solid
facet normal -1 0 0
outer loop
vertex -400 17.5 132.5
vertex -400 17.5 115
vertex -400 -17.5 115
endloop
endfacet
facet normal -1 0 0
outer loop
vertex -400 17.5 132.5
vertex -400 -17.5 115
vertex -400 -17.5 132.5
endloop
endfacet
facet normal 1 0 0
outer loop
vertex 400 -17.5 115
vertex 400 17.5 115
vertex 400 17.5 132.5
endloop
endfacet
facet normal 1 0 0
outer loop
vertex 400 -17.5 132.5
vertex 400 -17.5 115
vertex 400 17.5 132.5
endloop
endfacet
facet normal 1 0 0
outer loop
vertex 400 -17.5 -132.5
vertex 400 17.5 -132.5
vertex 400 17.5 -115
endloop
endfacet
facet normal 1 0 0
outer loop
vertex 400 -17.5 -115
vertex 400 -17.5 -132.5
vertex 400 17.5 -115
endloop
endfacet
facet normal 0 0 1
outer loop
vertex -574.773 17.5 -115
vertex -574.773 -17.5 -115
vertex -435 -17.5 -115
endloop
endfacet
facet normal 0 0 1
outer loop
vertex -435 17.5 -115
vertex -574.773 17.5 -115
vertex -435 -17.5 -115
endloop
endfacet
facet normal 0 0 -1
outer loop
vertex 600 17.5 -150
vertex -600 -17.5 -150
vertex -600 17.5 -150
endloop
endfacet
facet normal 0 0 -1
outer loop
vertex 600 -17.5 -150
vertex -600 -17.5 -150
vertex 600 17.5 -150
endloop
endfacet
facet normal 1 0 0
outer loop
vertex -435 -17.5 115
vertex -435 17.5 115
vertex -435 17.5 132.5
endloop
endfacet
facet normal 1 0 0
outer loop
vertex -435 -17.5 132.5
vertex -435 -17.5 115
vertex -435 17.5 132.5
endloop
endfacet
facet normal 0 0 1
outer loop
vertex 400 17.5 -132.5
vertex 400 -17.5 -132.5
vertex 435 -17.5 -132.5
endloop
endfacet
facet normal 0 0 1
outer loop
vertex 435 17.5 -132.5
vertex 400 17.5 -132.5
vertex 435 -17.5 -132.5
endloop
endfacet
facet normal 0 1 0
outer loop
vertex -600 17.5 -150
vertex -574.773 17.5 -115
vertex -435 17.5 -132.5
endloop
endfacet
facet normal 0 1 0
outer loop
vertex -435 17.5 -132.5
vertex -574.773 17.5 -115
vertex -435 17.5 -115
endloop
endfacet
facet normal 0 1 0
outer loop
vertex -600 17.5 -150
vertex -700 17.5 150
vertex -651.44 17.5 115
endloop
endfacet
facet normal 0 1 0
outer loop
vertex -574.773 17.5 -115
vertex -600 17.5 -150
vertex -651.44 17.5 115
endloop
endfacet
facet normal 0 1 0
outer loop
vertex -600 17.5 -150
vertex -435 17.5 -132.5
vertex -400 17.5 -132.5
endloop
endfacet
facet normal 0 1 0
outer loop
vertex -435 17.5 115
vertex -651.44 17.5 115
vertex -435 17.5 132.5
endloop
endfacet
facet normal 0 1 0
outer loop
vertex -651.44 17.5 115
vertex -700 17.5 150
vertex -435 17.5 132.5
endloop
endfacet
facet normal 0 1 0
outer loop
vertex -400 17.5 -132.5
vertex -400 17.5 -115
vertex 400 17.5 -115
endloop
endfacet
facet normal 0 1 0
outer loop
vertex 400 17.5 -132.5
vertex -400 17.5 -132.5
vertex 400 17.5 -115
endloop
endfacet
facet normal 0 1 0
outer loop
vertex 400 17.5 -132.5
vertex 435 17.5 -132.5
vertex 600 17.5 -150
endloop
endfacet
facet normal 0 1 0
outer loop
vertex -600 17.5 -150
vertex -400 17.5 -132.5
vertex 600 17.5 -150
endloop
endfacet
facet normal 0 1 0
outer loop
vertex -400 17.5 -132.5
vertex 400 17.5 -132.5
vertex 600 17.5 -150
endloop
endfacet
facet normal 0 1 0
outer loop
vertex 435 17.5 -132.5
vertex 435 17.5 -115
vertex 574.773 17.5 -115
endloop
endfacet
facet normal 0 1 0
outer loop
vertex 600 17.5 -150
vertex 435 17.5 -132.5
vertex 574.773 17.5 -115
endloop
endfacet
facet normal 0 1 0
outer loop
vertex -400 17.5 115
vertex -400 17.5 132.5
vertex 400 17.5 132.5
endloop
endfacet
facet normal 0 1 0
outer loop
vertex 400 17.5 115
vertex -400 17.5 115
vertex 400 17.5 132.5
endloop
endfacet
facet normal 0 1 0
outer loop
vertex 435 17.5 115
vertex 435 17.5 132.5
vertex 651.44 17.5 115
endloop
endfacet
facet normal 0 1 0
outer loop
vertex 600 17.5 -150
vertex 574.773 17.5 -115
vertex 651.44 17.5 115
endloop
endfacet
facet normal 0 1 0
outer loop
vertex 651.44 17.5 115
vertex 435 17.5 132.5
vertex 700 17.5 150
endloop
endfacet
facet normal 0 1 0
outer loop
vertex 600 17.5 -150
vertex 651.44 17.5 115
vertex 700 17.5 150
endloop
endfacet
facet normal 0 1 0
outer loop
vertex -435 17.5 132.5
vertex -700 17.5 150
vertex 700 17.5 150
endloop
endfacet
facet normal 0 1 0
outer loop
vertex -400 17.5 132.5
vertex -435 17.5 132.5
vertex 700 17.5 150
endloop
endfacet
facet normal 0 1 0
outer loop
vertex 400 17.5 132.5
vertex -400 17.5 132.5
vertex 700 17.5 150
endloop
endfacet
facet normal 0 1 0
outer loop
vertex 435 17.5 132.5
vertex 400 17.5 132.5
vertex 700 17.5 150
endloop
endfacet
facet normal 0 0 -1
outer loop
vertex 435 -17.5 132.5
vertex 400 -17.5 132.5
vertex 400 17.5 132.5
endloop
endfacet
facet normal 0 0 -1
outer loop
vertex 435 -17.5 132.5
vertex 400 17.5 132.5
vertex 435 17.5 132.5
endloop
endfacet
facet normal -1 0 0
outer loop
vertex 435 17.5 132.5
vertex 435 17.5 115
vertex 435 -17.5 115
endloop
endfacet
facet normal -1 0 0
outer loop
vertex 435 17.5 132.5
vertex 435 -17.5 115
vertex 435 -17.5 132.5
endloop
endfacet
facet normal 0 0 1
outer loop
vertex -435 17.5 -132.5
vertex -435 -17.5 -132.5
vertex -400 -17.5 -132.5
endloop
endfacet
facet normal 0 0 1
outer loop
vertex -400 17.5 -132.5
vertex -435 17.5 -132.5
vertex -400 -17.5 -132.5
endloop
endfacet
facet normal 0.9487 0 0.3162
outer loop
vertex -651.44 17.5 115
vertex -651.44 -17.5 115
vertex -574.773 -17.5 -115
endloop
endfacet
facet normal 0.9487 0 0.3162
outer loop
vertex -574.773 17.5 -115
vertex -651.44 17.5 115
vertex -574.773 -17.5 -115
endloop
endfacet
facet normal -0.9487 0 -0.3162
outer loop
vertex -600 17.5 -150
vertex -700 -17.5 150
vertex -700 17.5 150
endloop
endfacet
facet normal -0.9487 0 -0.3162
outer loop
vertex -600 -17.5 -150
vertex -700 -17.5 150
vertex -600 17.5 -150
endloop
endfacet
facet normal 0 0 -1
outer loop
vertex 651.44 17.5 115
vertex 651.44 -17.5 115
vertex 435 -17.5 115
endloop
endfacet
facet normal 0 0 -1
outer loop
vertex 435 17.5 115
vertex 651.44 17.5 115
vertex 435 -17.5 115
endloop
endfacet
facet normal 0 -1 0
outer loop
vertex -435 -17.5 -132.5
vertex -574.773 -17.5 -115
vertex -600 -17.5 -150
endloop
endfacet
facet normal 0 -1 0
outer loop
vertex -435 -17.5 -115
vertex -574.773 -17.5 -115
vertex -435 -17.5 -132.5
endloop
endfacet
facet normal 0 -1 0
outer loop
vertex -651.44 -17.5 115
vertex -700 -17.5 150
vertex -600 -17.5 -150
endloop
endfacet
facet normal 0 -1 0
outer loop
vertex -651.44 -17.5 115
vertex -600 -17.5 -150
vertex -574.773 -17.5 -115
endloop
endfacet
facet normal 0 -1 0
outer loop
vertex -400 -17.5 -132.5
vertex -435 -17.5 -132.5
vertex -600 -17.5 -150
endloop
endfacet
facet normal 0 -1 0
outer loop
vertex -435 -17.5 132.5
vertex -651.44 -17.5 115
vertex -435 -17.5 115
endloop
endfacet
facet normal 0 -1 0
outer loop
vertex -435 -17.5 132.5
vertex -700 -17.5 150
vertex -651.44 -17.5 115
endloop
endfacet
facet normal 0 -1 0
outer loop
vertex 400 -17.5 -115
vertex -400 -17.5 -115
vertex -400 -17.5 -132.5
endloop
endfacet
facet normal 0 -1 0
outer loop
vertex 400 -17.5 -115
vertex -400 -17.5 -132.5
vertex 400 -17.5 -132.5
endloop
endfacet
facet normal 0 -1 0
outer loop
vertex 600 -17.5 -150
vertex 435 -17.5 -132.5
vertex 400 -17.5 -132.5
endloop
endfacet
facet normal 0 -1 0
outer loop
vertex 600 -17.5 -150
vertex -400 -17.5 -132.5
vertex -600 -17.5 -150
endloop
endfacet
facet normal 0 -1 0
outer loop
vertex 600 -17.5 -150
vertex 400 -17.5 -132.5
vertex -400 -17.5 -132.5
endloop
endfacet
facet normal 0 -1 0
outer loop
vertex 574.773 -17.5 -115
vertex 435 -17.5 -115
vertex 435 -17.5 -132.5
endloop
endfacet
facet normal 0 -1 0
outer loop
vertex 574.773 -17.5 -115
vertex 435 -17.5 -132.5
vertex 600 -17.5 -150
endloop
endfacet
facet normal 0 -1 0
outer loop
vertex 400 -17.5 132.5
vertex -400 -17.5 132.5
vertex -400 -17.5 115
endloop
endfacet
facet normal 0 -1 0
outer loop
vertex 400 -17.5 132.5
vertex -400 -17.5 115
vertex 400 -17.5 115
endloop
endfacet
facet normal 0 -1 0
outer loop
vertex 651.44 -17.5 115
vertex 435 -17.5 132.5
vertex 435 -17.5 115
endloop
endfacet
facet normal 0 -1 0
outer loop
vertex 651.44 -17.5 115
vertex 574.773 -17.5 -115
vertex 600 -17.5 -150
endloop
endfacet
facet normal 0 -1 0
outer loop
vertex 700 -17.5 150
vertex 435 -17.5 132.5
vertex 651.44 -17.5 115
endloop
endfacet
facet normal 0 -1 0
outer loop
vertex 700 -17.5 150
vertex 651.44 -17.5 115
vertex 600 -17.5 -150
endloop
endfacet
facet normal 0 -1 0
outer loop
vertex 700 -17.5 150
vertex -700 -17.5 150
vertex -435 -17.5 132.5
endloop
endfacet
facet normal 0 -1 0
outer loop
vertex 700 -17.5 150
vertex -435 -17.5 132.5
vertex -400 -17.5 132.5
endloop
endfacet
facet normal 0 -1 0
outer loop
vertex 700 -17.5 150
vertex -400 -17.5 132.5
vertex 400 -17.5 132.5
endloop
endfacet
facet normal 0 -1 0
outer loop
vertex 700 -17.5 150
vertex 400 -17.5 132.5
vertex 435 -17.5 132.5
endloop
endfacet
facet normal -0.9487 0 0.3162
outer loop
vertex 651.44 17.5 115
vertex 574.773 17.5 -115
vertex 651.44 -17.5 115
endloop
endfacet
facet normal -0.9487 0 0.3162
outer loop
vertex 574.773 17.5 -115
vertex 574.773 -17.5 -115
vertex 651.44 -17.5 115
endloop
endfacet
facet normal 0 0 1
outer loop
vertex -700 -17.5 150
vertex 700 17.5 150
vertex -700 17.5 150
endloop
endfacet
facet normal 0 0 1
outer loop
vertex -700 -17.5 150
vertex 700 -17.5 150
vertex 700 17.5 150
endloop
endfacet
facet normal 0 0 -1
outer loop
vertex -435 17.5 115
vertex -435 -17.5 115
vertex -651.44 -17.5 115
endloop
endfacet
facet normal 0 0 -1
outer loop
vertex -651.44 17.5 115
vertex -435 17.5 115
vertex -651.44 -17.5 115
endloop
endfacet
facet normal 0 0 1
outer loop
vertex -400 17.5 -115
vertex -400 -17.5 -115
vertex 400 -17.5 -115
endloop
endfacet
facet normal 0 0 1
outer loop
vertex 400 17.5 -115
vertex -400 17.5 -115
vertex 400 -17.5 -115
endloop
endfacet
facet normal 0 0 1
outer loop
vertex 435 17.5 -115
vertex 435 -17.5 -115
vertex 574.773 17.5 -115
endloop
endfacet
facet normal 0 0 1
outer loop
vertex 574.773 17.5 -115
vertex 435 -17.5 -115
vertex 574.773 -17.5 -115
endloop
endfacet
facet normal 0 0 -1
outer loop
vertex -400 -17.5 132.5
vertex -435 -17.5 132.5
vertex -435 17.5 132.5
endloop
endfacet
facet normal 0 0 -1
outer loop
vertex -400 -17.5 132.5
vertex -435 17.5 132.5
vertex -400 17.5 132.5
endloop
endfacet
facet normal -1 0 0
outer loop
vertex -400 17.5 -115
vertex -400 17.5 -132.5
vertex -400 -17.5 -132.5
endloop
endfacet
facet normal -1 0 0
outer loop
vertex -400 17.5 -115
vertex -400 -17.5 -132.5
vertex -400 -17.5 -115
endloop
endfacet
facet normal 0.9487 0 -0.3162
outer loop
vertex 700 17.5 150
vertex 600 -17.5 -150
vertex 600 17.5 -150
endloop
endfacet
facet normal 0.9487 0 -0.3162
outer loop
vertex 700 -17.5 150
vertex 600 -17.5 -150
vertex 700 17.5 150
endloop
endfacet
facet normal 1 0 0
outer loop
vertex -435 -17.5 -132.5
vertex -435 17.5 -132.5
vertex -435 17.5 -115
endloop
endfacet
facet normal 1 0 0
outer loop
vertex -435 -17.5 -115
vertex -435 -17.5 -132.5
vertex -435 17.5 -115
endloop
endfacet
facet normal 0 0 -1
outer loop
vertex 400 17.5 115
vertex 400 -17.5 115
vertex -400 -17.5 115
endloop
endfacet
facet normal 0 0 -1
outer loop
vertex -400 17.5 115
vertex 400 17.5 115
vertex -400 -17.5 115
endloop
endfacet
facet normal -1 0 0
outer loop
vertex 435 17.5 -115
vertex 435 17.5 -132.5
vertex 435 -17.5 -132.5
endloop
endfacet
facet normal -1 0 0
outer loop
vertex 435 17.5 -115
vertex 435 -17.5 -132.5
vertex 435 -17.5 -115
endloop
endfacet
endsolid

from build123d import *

# Parameters (mm, degrees)
F2_DEPTH  = 17.5
F3_DEPTH  = 17.5
F4_W      = 35
F4_H      = 17.5
F5_DEPTH  = 35
F6_W      = 35
F6_H      = 17.5
F7_DEPTH  = 35
F8_W      = 35
F8_H      = 17.5
F9_DEPTH  = 35
F10_W     = 35
F10_H     = 17.5
F11_DEPTH = 35


with BuildPart() as f2:
    # F0 (on Front) → F2 (new body, symmetric)
    with BuildSketch(Plane.XZ):
        Polygon((700, 150), (-700, 150), (-600, -150), (600, -150), align=None)
    extrude(amount=F2_DEPTH, both=True)

    # F1 (on face) → F3 (cut, symmetric)
    with BuildSketch(Plane.XZ):
        Polygon((651.440094, 115), (-651.440094, 115), (-574.773427, -115), (574.773427, -115), align=None)
    extrude(amount=F3_DEPTH, both=True, mode=Mode.SUBTRACT)

    # F4 (on face) → F5 (cut)
    with BuildSketch(Plane.XZ.offset(17.5)):
        with Locations((-417.5, -123.75)):
            Rectangle(F4_W, F4_H)
    extrude(amount=-F5_DEPTH, mode=Mode.SUBTRACT)

    # F6 (on face) → F7 (cut)
    with BuildSketch(Plane.XZ.offset(17.5)):
        with Locations((417.5, -123.75)):
            Rectangle(F6_W, F6_H)
    extrude(amount=-F7_DEPTH, mode=Mode.SUBTRACT)

    # F8 (on face) → F9 (cut)
    with BuildSketch(Plane.XZ.offset(17.5)):
        with Locations((-417.5, 123.75)):
            Rectangle(F8_W, F8_H)
    extrude(amount=-F9_DEPTH, mode=Mode.SUBTRACT)

    # F10 (on face) → F11 (cut)
    with BuildSketch(Plane.XZ.offset(17.5)):
        with Locations((417.5, 123.75)):
            Rectangle(F10_W, F10_H)
    extrude(amount=-F11_DEPTH, mode=Mode.SUBTRACT)


solid = f2.part
